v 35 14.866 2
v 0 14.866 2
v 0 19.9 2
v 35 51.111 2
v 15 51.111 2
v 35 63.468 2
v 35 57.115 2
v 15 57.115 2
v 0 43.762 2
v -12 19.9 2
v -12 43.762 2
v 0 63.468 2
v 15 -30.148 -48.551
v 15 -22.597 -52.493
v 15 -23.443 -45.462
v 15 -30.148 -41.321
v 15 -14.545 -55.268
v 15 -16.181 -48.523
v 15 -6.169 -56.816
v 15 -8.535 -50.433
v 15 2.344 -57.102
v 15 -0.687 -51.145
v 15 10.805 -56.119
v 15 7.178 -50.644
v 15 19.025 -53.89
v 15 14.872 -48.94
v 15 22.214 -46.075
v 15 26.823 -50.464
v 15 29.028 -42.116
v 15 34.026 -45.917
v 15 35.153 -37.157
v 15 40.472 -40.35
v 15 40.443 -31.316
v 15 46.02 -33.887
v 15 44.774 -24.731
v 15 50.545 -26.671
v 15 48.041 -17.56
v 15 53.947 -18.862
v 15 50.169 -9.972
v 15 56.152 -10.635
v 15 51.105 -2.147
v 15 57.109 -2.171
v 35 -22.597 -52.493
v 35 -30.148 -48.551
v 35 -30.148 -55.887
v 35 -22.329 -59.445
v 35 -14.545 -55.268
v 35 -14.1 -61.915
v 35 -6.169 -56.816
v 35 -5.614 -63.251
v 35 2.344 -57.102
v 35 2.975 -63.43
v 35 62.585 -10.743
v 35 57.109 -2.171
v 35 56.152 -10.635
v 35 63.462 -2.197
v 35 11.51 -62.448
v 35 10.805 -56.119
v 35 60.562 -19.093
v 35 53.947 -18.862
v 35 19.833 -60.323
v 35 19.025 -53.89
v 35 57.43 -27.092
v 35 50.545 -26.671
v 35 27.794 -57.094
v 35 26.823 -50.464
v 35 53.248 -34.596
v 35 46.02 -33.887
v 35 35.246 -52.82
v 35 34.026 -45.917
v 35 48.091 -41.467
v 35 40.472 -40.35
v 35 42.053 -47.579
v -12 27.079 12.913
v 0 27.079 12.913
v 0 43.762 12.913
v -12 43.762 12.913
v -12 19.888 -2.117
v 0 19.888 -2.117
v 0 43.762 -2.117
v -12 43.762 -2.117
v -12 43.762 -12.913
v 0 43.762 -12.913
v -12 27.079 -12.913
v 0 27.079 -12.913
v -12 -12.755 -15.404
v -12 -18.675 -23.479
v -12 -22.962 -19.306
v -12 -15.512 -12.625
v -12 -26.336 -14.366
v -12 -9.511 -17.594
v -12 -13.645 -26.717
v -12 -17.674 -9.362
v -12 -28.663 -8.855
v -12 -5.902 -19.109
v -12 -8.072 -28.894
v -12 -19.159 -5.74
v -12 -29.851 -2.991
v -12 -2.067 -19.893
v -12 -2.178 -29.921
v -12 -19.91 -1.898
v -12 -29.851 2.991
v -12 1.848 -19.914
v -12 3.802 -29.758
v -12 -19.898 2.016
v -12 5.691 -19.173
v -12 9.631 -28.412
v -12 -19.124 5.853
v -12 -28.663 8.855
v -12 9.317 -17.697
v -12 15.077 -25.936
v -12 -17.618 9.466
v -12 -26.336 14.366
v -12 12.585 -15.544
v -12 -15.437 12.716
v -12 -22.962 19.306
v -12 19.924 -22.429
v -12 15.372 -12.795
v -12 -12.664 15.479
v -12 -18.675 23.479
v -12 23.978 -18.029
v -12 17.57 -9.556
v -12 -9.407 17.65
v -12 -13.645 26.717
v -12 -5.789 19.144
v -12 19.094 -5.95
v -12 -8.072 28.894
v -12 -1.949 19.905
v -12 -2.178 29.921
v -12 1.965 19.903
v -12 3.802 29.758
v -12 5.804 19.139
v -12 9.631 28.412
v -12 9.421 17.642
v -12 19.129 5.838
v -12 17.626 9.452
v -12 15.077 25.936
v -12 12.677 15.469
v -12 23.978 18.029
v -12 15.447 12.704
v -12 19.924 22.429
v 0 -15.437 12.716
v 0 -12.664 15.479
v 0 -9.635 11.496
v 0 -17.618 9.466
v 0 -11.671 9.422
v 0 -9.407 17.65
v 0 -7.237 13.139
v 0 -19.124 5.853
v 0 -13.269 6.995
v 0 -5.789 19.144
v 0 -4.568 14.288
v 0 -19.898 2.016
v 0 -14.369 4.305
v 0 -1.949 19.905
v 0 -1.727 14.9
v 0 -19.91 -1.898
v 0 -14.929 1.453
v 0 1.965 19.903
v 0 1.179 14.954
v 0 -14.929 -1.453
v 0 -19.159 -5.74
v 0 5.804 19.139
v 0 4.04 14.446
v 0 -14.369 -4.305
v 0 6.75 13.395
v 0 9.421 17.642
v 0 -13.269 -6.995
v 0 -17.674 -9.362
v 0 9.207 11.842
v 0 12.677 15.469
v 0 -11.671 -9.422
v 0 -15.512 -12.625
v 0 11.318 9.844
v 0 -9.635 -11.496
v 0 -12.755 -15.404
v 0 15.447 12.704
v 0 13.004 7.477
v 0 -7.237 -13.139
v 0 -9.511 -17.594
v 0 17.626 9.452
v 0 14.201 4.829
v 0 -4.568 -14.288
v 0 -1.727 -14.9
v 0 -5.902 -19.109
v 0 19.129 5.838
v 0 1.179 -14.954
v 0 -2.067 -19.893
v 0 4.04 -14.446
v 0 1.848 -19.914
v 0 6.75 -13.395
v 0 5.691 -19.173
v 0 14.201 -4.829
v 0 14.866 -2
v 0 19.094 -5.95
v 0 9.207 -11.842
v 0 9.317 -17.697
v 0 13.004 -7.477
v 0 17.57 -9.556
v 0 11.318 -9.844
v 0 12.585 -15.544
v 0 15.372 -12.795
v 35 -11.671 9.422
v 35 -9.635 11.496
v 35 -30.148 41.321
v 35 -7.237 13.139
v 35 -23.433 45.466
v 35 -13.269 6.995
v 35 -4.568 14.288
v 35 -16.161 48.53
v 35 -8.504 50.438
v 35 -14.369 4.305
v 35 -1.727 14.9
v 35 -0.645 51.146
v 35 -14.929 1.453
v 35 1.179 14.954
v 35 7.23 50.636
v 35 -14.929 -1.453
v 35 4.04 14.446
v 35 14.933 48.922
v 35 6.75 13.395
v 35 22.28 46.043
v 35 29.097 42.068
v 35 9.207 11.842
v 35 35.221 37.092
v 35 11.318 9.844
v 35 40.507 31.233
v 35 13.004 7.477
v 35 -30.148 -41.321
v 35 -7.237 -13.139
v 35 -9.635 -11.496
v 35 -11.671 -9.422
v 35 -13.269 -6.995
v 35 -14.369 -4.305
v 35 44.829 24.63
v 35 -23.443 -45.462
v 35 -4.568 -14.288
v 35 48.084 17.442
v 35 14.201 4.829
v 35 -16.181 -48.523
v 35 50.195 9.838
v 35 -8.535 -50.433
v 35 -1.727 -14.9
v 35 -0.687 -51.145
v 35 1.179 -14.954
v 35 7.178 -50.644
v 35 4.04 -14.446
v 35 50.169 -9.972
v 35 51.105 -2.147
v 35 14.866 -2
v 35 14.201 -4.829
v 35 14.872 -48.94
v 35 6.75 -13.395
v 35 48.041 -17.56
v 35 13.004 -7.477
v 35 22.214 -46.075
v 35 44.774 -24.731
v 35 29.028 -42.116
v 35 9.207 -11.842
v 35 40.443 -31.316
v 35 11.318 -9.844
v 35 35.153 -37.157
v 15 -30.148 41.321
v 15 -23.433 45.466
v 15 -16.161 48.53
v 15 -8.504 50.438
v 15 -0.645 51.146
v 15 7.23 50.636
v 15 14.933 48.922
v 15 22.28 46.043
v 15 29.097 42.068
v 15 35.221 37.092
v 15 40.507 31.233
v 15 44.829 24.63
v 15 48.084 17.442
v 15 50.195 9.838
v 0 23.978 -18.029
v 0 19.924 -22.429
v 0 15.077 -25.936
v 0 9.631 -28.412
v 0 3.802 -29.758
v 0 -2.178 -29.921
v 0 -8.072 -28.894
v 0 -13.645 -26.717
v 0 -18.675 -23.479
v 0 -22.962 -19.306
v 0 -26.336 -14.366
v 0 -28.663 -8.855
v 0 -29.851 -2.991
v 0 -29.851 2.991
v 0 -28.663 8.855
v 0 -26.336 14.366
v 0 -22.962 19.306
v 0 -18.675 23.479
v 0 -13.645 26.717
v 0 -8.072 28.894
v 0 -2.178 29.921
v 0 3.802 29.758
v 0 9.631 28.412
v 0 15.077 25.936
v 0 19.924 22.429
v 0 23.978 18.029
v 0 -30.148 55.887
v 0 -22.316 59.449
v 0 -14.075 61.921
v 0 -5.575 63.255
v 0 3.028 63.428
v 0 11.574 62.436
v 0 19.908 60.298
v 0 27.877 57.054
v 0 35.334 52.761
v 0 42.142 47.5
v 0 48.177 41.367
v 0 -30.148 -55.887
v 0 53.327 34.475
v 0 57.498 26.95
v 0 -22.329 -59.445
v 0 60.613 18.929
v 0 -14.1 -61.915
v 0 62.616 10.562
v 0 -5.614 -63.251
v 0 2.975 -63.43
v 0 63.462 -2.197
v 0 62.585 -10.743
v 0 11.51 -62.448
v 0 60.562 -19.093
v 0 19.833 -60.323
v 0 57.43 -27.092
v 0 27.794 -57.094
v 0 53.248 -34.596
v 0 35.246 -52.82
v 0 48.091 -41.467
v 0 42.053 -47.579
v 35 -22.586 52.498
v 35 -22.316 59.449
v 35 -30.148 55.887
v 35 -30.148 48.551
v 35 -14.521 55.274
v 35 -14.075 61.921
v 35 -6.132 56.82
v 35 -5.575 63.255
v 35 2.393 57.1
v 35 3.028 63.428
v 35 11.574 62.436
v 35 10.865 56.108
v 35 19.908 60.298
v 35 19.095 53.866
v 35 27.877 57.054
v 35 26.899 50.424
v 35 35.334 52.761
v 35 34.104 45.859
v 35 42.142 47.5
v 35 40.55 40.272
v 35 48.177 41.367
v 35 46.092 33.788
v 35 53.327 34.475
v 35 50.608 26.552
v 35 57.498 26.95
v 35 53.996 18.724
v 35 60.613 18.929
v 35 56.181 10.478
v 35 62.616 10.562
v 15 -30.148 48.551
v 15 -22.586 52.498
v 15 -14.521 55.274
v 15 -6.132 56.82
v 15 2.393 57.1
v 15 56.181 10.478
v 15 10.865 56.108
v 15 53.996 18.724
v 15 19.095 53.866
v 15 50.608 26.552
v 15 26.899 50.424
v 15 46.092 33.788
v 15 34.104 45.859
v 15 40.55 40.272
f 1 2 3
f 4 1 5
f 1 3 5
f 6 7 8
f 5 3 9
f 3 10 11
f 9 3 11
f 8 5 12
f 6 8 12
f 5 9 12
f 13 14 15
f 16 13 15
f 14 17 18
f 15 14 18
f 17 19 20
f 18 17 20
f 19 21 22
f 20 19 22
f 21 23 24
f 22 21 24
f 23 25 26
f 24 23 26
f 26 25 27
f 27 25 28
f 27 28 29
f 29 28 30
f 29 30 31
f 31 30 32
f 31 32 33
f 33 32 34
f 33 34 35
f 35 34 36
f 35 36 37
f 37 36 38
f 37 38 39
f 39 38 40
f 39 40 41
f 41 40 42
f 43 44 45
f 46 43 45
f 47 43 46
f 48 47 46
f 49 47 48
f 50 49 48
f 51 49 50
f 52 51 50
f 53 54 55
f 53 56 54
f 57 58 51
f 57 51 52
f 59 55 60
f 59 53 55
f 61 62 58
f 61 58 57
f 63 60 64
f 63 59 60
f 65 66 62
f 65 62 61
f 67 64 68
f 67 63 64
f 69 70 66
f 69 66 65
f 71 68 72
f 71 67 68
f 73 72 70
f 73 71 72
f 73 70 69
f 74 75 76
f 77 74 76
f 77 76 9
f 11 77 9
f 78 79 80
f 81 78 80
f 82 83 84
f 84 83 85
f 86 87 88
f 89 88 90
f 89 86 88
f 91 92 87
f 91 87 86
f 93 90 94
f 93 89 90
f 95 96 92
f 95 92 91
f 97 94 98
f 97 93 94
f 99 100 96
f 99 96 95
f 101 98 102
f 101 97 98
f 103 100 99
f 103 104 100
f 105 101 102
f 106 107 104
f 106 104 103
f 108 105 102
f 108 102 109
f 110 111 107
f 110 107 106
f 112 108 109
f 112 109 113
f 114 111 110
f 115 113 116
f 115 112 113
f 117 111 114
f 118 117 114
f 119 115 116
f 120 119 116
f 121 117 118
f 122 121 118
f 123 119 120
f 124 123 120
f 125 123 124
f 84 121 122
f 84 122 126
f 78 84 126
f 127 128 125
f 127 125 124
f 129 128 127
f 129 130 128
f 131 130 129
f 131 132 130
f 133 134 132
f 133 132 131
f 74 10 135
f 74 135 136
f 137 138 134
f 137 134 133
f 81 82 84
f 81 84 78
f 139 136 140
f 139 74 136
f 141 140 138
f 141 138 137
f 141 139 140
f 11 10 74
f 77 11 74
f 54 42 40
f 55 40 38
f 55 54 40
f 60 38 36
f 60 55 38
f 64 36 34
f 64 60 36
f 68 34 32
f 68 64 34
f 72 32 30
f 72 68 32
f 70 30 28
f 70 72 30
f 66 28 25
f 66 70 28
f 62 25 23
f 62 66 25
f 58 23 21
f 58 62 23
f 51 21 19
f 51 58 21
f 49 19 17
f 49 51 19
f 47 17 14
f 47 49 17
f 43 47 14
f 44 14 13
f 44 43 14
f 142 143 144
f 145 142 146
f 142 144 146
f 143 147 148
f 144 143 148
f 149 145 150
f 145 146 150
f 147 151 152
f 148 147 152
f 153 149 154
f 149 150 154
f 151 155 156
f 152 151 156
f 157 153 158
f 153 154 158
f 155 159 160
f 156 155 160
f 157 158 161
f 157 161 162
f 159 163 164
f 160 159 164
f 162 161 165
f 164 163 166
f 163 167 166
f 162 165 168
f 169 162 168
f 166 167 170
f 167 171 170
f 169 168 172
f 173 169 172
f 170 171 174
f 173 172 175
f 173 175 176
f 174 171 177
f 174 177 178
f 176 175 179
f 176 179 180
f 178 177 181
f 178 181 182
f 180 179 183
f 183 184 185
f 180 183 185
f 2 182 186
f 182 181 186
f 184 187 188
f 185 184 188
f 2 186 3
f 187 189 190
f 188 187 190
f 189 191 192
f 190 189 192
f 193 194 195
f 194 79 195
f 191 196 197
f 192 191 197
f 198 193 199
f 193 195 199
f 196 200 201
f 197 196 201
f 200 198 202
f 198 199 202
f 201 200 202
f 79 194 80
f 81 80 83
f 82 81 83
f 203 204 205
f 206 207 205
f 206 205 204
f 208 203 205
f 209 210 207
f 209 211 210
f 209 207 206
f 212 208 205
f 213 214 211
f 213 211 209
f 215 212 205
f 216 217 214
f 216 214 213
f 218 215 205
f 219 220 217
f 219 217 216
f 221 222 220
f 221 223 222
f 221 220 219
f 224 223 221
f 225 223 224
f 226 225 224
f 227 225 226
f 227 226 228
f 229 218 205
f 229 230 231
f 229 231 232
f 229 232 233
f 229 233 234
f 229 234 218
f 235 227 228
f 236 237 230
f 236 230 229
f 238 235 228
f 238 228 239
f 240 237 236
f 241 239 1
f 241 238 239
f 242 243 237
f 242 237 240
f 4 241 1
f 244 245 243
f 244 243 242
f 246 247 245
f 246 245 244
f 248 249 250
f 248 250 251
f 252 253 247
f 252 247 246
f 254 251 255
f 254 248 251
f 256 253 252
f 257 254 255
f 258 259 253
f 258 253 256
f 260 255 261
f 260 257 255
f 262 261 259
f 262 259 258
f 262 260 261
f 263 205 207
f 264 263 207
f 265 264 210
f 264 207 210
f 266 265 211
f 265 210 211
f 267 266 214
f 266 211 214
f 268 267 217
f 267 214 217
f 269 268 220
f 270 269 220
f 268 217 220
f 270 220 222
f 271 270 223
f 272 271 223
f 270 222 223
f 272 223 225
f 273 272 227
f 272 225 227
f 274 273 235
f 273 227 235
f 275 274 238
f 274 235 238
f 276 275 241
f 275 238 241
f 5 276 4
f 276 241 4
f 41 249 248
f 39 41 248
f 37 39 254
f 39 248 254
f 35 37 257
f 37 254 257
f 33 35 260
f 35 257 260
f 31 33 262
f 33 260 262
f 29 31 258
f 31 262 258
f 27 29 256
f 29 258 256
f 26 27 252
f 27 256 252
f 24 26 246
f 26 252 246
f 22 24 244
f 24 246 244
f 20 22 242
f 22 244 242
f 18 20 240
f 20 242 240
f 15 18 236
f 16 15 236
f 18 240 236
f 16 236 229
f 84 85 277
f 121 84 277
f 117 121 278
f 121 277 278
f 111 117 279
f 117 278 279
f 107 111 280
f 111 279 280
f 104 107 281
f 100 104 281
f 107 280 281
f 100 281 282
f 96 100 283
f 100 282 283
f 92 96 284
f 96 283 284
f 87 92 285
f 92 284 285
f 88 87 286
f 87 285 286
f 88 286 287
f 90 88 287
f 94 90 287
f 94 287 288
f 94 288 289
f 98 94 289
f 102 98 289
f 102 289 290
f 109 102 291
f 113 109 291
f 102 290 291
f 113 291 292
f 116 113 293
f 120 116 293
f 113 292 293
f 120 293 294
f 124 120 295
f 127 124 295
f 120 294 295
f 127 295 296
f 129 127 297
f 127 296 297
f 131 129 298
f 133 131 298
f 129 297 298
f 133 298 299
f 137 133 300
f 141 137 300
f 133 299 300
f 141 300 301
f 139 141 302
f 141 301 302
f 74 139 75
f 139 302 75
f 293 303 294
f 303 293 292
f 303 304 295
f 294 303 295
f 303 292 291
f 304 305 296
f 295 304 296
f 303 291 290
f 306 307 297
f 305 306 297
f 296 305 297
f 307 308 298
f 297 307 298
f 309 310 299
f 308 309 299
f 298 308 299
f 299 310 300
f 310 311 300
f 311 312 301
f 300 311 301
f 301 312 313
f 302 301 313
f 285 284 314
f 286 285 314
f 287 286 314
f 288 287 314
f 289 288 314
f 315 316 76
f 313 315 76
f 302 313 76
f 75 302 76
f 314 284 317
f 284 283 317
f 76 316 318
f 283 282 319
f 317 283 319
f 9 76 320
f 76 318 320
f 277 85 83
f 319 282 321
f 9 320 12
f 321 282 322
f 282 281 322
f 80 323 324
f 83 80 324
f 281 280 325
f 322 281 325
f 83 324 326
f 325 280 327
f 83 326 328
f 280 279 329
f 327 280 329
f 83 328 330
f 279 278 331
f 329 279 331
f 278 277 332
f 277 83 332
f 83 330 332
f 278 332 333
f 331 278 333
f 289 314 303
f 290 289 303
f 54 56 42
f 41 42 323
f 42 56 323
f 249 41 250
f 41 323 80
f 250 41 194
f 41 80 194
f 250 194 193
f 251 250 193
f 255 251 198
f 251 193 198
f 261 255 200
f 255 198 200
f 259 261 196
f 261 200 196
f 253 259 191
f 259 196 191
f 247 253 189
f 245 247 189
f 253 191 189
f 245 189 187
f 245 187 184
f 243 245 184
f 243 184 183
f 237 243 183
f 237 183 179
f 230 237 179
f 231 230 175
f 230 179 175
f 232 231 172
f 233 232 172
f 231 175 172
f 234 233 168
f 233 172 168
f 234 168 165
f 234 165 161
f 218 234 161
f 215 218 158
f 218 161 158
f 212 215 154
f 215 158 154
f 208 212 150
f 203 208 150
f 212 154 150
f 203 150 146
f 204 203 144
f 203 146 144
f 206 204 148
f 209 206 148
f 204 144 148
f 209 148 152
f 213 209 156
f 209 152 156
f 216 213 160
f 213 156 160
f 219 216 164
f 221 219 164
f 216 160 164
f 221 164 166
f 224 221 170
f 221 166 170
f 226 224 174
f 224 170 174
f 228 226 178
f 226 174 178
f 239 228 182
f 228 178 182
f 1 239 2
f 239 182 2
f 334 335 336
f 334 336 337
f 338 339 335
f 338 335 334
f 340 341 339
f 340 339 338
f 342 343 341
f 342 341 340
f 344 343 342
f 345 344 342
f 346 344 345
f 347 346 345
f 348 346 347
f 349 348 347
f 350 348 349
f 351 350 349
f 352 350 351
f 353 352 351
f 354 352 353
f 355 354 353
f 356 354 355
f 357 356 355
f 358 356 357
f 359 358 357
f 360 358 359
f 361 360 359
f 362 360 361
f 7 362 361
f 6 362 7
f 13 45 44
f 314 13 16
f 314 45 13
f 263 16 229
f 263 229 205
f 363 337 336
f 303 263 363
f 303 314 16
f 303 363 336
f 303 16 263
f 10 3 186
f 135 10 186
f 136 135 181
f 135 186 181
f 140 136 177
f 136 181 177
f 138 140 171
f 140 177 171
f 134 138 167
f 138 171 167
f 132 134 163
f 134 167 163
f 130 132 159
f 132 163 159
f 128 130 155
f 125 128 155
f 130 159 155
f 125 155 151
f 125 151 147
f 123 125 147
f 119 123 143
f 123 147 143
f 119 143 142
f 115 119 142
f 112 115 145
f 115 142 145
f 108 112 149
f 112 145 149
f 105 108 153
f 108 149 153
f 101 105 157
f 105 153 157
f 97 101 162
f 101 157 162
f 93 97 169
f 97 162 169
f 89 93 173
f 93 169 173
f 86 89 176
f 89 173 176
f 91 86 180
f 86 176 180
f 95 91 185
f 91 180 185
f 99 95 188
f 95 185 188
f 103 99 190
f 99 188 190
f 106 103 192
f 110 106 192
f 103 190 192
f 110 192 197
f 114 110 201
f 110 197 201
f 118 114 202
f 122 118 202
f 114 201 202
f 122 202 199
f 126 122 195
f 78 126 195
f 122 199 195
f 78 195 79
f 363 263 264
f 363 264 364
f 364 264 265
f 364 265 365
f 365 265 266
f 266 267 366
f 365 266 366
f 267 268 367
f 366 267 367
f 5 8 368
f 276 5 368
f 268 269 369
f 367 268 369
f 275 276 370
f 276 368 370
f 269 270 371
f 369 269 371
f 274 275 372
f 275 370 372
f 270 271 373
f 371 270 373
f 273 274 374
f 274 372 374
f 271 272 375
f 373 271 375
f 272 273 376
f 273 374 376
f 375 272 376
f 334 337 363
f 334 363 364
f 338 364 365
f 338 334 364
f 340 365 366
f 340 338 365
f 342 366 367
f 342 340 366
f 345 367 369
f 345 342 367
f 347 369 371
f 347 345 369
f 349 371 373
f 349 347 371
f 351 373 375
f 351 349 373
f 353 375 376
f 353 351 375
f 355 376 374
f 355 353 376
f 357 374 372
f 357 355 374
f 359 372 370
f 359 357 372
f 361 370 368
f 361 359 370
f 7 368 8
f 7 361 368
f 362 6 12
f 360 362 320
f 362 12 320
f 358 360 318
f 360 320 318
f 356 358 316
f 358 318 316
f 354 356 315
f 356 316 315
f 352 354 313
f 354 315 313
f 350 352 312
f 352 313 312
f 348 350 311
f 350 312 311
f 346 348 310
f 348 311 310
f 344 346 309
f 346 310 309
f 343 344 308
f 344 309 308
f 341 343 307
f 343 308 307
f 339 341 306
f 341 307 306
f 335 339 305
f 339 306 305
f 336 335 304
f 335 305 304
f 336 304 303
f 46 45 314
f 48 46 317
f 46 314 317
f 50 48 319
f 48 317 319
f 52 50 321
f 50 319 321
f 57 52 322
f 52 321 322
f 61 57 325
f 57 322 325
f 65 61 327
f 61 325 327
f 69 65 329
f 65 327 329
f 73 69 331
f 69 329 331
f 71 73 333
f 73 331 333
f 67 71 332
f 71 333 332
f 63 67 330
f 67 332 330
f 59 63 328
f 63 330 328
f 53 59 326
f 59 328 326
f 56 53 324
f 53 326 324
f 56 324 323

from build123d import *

# Parameters (mm, degrees)
SALIENTE_EXTRUIR1_DEPTH = 35
SALIENTE_EXTRUIR2_DEPTH = 12
CROQUIS2_R              = 57.15
CROQUIS2_R_2            = 51.15
CORTAR_EXTRUIR2_DEPTH   = 20
CORTAR_EXTRUIR3_REACH   = 98.382
CROQUIS4_W              = 151.714378115
CROQUIS4_H              = 39.157803324


with BuildPart() as part:
    # Croquis1 → Saliente-Extruir1 (new body)
    with BuildSketch(Plane(origin=(0, 0, 0), x_dir=(0, 0, -1), z_dir=(1, 0, 0))):
        with BuildLine():
            Line((-2, 14.866068747), (-2, 63.468496122))
            ThreePointArc((-2, 63.468496122), (-0.098669817, -63.499923341), (2.197231834, 63.461974223))
            Line((2.197231834, 63.461974223), (2, 14.866068747))
            ThreePointArc((2, 14.866068747), (0, -15), (-2, 14.866068747))
        make_face()
    extrude(amount=SALIENTE_EXTRUIR1_DEPTH)

    # Croquis3 → Saliente-Extruir2 (add)
    with BuildSketch(Plane.ZY):
        with BuildLine():
            Line((-2.1172783, 19.887612541), (-2.1172783, 43.76224174))
            Line((-2.1172783, 43.76224174), (-12.9131853, 43.76224174))
            Line((-12.9131853, 43.76224174), (-12.9131853, 27.07858278))
            ThreePointArc((-12.9131853, 27.07858278), (0, -30), (12.9131853, 27.07858278))
            Line((12.9131853, 27.07858278), (12.9131853, 43.76224174))
            Line((12.9131853, 43.76224174), (2, 43.76224174))
            Line((2, 43.76224174), (2, 19.899748742))
            ThreePointArc((2, 19.899748742), (0.058952284, -19.999913116), (-2.1172783, 19.887612541))
        make_face()
    extrude(amount=SALIENTE_EXTRUIR2_DEPTH)

    # Croquis2 → Cortar-Extruir2 (cut)
    with BuildSketch(Plane.ZY.offset(-35)):
        Circle(CROQUIS2_R)
        Circle(CROQUIS2_R_2, mode=Mode.SUBTRACT)
    extrude(amount=CORTAR_EXTRUIR2_DEPTH, mode=Mode.SUBTRACT)

    # Croquis4 → Cortar-Extruir3 (cut, up to next)
    with BuildSketch(Plane.ZY, mode=Mode.PRIVATE) as cortar_extruir3_sk1:
        with Locations((-1.340233023, -49.726897526)):
            Rectangle(CROQUIS4_W, CROQUIS4_H)
    cortar_extruir3_tool1 = extrude(cortar_extruir3_sk1.sketch, amount=-CORTAR_EXTRUIR3_REACH, mode=Mode.PRIVATE) & part.part
    add(cortar_extruir3_tool1.solids().sort_by_distance((0, -49.726898, -1.340233))[0], mode=Mode.SUBTRACT)


solid = part.part
